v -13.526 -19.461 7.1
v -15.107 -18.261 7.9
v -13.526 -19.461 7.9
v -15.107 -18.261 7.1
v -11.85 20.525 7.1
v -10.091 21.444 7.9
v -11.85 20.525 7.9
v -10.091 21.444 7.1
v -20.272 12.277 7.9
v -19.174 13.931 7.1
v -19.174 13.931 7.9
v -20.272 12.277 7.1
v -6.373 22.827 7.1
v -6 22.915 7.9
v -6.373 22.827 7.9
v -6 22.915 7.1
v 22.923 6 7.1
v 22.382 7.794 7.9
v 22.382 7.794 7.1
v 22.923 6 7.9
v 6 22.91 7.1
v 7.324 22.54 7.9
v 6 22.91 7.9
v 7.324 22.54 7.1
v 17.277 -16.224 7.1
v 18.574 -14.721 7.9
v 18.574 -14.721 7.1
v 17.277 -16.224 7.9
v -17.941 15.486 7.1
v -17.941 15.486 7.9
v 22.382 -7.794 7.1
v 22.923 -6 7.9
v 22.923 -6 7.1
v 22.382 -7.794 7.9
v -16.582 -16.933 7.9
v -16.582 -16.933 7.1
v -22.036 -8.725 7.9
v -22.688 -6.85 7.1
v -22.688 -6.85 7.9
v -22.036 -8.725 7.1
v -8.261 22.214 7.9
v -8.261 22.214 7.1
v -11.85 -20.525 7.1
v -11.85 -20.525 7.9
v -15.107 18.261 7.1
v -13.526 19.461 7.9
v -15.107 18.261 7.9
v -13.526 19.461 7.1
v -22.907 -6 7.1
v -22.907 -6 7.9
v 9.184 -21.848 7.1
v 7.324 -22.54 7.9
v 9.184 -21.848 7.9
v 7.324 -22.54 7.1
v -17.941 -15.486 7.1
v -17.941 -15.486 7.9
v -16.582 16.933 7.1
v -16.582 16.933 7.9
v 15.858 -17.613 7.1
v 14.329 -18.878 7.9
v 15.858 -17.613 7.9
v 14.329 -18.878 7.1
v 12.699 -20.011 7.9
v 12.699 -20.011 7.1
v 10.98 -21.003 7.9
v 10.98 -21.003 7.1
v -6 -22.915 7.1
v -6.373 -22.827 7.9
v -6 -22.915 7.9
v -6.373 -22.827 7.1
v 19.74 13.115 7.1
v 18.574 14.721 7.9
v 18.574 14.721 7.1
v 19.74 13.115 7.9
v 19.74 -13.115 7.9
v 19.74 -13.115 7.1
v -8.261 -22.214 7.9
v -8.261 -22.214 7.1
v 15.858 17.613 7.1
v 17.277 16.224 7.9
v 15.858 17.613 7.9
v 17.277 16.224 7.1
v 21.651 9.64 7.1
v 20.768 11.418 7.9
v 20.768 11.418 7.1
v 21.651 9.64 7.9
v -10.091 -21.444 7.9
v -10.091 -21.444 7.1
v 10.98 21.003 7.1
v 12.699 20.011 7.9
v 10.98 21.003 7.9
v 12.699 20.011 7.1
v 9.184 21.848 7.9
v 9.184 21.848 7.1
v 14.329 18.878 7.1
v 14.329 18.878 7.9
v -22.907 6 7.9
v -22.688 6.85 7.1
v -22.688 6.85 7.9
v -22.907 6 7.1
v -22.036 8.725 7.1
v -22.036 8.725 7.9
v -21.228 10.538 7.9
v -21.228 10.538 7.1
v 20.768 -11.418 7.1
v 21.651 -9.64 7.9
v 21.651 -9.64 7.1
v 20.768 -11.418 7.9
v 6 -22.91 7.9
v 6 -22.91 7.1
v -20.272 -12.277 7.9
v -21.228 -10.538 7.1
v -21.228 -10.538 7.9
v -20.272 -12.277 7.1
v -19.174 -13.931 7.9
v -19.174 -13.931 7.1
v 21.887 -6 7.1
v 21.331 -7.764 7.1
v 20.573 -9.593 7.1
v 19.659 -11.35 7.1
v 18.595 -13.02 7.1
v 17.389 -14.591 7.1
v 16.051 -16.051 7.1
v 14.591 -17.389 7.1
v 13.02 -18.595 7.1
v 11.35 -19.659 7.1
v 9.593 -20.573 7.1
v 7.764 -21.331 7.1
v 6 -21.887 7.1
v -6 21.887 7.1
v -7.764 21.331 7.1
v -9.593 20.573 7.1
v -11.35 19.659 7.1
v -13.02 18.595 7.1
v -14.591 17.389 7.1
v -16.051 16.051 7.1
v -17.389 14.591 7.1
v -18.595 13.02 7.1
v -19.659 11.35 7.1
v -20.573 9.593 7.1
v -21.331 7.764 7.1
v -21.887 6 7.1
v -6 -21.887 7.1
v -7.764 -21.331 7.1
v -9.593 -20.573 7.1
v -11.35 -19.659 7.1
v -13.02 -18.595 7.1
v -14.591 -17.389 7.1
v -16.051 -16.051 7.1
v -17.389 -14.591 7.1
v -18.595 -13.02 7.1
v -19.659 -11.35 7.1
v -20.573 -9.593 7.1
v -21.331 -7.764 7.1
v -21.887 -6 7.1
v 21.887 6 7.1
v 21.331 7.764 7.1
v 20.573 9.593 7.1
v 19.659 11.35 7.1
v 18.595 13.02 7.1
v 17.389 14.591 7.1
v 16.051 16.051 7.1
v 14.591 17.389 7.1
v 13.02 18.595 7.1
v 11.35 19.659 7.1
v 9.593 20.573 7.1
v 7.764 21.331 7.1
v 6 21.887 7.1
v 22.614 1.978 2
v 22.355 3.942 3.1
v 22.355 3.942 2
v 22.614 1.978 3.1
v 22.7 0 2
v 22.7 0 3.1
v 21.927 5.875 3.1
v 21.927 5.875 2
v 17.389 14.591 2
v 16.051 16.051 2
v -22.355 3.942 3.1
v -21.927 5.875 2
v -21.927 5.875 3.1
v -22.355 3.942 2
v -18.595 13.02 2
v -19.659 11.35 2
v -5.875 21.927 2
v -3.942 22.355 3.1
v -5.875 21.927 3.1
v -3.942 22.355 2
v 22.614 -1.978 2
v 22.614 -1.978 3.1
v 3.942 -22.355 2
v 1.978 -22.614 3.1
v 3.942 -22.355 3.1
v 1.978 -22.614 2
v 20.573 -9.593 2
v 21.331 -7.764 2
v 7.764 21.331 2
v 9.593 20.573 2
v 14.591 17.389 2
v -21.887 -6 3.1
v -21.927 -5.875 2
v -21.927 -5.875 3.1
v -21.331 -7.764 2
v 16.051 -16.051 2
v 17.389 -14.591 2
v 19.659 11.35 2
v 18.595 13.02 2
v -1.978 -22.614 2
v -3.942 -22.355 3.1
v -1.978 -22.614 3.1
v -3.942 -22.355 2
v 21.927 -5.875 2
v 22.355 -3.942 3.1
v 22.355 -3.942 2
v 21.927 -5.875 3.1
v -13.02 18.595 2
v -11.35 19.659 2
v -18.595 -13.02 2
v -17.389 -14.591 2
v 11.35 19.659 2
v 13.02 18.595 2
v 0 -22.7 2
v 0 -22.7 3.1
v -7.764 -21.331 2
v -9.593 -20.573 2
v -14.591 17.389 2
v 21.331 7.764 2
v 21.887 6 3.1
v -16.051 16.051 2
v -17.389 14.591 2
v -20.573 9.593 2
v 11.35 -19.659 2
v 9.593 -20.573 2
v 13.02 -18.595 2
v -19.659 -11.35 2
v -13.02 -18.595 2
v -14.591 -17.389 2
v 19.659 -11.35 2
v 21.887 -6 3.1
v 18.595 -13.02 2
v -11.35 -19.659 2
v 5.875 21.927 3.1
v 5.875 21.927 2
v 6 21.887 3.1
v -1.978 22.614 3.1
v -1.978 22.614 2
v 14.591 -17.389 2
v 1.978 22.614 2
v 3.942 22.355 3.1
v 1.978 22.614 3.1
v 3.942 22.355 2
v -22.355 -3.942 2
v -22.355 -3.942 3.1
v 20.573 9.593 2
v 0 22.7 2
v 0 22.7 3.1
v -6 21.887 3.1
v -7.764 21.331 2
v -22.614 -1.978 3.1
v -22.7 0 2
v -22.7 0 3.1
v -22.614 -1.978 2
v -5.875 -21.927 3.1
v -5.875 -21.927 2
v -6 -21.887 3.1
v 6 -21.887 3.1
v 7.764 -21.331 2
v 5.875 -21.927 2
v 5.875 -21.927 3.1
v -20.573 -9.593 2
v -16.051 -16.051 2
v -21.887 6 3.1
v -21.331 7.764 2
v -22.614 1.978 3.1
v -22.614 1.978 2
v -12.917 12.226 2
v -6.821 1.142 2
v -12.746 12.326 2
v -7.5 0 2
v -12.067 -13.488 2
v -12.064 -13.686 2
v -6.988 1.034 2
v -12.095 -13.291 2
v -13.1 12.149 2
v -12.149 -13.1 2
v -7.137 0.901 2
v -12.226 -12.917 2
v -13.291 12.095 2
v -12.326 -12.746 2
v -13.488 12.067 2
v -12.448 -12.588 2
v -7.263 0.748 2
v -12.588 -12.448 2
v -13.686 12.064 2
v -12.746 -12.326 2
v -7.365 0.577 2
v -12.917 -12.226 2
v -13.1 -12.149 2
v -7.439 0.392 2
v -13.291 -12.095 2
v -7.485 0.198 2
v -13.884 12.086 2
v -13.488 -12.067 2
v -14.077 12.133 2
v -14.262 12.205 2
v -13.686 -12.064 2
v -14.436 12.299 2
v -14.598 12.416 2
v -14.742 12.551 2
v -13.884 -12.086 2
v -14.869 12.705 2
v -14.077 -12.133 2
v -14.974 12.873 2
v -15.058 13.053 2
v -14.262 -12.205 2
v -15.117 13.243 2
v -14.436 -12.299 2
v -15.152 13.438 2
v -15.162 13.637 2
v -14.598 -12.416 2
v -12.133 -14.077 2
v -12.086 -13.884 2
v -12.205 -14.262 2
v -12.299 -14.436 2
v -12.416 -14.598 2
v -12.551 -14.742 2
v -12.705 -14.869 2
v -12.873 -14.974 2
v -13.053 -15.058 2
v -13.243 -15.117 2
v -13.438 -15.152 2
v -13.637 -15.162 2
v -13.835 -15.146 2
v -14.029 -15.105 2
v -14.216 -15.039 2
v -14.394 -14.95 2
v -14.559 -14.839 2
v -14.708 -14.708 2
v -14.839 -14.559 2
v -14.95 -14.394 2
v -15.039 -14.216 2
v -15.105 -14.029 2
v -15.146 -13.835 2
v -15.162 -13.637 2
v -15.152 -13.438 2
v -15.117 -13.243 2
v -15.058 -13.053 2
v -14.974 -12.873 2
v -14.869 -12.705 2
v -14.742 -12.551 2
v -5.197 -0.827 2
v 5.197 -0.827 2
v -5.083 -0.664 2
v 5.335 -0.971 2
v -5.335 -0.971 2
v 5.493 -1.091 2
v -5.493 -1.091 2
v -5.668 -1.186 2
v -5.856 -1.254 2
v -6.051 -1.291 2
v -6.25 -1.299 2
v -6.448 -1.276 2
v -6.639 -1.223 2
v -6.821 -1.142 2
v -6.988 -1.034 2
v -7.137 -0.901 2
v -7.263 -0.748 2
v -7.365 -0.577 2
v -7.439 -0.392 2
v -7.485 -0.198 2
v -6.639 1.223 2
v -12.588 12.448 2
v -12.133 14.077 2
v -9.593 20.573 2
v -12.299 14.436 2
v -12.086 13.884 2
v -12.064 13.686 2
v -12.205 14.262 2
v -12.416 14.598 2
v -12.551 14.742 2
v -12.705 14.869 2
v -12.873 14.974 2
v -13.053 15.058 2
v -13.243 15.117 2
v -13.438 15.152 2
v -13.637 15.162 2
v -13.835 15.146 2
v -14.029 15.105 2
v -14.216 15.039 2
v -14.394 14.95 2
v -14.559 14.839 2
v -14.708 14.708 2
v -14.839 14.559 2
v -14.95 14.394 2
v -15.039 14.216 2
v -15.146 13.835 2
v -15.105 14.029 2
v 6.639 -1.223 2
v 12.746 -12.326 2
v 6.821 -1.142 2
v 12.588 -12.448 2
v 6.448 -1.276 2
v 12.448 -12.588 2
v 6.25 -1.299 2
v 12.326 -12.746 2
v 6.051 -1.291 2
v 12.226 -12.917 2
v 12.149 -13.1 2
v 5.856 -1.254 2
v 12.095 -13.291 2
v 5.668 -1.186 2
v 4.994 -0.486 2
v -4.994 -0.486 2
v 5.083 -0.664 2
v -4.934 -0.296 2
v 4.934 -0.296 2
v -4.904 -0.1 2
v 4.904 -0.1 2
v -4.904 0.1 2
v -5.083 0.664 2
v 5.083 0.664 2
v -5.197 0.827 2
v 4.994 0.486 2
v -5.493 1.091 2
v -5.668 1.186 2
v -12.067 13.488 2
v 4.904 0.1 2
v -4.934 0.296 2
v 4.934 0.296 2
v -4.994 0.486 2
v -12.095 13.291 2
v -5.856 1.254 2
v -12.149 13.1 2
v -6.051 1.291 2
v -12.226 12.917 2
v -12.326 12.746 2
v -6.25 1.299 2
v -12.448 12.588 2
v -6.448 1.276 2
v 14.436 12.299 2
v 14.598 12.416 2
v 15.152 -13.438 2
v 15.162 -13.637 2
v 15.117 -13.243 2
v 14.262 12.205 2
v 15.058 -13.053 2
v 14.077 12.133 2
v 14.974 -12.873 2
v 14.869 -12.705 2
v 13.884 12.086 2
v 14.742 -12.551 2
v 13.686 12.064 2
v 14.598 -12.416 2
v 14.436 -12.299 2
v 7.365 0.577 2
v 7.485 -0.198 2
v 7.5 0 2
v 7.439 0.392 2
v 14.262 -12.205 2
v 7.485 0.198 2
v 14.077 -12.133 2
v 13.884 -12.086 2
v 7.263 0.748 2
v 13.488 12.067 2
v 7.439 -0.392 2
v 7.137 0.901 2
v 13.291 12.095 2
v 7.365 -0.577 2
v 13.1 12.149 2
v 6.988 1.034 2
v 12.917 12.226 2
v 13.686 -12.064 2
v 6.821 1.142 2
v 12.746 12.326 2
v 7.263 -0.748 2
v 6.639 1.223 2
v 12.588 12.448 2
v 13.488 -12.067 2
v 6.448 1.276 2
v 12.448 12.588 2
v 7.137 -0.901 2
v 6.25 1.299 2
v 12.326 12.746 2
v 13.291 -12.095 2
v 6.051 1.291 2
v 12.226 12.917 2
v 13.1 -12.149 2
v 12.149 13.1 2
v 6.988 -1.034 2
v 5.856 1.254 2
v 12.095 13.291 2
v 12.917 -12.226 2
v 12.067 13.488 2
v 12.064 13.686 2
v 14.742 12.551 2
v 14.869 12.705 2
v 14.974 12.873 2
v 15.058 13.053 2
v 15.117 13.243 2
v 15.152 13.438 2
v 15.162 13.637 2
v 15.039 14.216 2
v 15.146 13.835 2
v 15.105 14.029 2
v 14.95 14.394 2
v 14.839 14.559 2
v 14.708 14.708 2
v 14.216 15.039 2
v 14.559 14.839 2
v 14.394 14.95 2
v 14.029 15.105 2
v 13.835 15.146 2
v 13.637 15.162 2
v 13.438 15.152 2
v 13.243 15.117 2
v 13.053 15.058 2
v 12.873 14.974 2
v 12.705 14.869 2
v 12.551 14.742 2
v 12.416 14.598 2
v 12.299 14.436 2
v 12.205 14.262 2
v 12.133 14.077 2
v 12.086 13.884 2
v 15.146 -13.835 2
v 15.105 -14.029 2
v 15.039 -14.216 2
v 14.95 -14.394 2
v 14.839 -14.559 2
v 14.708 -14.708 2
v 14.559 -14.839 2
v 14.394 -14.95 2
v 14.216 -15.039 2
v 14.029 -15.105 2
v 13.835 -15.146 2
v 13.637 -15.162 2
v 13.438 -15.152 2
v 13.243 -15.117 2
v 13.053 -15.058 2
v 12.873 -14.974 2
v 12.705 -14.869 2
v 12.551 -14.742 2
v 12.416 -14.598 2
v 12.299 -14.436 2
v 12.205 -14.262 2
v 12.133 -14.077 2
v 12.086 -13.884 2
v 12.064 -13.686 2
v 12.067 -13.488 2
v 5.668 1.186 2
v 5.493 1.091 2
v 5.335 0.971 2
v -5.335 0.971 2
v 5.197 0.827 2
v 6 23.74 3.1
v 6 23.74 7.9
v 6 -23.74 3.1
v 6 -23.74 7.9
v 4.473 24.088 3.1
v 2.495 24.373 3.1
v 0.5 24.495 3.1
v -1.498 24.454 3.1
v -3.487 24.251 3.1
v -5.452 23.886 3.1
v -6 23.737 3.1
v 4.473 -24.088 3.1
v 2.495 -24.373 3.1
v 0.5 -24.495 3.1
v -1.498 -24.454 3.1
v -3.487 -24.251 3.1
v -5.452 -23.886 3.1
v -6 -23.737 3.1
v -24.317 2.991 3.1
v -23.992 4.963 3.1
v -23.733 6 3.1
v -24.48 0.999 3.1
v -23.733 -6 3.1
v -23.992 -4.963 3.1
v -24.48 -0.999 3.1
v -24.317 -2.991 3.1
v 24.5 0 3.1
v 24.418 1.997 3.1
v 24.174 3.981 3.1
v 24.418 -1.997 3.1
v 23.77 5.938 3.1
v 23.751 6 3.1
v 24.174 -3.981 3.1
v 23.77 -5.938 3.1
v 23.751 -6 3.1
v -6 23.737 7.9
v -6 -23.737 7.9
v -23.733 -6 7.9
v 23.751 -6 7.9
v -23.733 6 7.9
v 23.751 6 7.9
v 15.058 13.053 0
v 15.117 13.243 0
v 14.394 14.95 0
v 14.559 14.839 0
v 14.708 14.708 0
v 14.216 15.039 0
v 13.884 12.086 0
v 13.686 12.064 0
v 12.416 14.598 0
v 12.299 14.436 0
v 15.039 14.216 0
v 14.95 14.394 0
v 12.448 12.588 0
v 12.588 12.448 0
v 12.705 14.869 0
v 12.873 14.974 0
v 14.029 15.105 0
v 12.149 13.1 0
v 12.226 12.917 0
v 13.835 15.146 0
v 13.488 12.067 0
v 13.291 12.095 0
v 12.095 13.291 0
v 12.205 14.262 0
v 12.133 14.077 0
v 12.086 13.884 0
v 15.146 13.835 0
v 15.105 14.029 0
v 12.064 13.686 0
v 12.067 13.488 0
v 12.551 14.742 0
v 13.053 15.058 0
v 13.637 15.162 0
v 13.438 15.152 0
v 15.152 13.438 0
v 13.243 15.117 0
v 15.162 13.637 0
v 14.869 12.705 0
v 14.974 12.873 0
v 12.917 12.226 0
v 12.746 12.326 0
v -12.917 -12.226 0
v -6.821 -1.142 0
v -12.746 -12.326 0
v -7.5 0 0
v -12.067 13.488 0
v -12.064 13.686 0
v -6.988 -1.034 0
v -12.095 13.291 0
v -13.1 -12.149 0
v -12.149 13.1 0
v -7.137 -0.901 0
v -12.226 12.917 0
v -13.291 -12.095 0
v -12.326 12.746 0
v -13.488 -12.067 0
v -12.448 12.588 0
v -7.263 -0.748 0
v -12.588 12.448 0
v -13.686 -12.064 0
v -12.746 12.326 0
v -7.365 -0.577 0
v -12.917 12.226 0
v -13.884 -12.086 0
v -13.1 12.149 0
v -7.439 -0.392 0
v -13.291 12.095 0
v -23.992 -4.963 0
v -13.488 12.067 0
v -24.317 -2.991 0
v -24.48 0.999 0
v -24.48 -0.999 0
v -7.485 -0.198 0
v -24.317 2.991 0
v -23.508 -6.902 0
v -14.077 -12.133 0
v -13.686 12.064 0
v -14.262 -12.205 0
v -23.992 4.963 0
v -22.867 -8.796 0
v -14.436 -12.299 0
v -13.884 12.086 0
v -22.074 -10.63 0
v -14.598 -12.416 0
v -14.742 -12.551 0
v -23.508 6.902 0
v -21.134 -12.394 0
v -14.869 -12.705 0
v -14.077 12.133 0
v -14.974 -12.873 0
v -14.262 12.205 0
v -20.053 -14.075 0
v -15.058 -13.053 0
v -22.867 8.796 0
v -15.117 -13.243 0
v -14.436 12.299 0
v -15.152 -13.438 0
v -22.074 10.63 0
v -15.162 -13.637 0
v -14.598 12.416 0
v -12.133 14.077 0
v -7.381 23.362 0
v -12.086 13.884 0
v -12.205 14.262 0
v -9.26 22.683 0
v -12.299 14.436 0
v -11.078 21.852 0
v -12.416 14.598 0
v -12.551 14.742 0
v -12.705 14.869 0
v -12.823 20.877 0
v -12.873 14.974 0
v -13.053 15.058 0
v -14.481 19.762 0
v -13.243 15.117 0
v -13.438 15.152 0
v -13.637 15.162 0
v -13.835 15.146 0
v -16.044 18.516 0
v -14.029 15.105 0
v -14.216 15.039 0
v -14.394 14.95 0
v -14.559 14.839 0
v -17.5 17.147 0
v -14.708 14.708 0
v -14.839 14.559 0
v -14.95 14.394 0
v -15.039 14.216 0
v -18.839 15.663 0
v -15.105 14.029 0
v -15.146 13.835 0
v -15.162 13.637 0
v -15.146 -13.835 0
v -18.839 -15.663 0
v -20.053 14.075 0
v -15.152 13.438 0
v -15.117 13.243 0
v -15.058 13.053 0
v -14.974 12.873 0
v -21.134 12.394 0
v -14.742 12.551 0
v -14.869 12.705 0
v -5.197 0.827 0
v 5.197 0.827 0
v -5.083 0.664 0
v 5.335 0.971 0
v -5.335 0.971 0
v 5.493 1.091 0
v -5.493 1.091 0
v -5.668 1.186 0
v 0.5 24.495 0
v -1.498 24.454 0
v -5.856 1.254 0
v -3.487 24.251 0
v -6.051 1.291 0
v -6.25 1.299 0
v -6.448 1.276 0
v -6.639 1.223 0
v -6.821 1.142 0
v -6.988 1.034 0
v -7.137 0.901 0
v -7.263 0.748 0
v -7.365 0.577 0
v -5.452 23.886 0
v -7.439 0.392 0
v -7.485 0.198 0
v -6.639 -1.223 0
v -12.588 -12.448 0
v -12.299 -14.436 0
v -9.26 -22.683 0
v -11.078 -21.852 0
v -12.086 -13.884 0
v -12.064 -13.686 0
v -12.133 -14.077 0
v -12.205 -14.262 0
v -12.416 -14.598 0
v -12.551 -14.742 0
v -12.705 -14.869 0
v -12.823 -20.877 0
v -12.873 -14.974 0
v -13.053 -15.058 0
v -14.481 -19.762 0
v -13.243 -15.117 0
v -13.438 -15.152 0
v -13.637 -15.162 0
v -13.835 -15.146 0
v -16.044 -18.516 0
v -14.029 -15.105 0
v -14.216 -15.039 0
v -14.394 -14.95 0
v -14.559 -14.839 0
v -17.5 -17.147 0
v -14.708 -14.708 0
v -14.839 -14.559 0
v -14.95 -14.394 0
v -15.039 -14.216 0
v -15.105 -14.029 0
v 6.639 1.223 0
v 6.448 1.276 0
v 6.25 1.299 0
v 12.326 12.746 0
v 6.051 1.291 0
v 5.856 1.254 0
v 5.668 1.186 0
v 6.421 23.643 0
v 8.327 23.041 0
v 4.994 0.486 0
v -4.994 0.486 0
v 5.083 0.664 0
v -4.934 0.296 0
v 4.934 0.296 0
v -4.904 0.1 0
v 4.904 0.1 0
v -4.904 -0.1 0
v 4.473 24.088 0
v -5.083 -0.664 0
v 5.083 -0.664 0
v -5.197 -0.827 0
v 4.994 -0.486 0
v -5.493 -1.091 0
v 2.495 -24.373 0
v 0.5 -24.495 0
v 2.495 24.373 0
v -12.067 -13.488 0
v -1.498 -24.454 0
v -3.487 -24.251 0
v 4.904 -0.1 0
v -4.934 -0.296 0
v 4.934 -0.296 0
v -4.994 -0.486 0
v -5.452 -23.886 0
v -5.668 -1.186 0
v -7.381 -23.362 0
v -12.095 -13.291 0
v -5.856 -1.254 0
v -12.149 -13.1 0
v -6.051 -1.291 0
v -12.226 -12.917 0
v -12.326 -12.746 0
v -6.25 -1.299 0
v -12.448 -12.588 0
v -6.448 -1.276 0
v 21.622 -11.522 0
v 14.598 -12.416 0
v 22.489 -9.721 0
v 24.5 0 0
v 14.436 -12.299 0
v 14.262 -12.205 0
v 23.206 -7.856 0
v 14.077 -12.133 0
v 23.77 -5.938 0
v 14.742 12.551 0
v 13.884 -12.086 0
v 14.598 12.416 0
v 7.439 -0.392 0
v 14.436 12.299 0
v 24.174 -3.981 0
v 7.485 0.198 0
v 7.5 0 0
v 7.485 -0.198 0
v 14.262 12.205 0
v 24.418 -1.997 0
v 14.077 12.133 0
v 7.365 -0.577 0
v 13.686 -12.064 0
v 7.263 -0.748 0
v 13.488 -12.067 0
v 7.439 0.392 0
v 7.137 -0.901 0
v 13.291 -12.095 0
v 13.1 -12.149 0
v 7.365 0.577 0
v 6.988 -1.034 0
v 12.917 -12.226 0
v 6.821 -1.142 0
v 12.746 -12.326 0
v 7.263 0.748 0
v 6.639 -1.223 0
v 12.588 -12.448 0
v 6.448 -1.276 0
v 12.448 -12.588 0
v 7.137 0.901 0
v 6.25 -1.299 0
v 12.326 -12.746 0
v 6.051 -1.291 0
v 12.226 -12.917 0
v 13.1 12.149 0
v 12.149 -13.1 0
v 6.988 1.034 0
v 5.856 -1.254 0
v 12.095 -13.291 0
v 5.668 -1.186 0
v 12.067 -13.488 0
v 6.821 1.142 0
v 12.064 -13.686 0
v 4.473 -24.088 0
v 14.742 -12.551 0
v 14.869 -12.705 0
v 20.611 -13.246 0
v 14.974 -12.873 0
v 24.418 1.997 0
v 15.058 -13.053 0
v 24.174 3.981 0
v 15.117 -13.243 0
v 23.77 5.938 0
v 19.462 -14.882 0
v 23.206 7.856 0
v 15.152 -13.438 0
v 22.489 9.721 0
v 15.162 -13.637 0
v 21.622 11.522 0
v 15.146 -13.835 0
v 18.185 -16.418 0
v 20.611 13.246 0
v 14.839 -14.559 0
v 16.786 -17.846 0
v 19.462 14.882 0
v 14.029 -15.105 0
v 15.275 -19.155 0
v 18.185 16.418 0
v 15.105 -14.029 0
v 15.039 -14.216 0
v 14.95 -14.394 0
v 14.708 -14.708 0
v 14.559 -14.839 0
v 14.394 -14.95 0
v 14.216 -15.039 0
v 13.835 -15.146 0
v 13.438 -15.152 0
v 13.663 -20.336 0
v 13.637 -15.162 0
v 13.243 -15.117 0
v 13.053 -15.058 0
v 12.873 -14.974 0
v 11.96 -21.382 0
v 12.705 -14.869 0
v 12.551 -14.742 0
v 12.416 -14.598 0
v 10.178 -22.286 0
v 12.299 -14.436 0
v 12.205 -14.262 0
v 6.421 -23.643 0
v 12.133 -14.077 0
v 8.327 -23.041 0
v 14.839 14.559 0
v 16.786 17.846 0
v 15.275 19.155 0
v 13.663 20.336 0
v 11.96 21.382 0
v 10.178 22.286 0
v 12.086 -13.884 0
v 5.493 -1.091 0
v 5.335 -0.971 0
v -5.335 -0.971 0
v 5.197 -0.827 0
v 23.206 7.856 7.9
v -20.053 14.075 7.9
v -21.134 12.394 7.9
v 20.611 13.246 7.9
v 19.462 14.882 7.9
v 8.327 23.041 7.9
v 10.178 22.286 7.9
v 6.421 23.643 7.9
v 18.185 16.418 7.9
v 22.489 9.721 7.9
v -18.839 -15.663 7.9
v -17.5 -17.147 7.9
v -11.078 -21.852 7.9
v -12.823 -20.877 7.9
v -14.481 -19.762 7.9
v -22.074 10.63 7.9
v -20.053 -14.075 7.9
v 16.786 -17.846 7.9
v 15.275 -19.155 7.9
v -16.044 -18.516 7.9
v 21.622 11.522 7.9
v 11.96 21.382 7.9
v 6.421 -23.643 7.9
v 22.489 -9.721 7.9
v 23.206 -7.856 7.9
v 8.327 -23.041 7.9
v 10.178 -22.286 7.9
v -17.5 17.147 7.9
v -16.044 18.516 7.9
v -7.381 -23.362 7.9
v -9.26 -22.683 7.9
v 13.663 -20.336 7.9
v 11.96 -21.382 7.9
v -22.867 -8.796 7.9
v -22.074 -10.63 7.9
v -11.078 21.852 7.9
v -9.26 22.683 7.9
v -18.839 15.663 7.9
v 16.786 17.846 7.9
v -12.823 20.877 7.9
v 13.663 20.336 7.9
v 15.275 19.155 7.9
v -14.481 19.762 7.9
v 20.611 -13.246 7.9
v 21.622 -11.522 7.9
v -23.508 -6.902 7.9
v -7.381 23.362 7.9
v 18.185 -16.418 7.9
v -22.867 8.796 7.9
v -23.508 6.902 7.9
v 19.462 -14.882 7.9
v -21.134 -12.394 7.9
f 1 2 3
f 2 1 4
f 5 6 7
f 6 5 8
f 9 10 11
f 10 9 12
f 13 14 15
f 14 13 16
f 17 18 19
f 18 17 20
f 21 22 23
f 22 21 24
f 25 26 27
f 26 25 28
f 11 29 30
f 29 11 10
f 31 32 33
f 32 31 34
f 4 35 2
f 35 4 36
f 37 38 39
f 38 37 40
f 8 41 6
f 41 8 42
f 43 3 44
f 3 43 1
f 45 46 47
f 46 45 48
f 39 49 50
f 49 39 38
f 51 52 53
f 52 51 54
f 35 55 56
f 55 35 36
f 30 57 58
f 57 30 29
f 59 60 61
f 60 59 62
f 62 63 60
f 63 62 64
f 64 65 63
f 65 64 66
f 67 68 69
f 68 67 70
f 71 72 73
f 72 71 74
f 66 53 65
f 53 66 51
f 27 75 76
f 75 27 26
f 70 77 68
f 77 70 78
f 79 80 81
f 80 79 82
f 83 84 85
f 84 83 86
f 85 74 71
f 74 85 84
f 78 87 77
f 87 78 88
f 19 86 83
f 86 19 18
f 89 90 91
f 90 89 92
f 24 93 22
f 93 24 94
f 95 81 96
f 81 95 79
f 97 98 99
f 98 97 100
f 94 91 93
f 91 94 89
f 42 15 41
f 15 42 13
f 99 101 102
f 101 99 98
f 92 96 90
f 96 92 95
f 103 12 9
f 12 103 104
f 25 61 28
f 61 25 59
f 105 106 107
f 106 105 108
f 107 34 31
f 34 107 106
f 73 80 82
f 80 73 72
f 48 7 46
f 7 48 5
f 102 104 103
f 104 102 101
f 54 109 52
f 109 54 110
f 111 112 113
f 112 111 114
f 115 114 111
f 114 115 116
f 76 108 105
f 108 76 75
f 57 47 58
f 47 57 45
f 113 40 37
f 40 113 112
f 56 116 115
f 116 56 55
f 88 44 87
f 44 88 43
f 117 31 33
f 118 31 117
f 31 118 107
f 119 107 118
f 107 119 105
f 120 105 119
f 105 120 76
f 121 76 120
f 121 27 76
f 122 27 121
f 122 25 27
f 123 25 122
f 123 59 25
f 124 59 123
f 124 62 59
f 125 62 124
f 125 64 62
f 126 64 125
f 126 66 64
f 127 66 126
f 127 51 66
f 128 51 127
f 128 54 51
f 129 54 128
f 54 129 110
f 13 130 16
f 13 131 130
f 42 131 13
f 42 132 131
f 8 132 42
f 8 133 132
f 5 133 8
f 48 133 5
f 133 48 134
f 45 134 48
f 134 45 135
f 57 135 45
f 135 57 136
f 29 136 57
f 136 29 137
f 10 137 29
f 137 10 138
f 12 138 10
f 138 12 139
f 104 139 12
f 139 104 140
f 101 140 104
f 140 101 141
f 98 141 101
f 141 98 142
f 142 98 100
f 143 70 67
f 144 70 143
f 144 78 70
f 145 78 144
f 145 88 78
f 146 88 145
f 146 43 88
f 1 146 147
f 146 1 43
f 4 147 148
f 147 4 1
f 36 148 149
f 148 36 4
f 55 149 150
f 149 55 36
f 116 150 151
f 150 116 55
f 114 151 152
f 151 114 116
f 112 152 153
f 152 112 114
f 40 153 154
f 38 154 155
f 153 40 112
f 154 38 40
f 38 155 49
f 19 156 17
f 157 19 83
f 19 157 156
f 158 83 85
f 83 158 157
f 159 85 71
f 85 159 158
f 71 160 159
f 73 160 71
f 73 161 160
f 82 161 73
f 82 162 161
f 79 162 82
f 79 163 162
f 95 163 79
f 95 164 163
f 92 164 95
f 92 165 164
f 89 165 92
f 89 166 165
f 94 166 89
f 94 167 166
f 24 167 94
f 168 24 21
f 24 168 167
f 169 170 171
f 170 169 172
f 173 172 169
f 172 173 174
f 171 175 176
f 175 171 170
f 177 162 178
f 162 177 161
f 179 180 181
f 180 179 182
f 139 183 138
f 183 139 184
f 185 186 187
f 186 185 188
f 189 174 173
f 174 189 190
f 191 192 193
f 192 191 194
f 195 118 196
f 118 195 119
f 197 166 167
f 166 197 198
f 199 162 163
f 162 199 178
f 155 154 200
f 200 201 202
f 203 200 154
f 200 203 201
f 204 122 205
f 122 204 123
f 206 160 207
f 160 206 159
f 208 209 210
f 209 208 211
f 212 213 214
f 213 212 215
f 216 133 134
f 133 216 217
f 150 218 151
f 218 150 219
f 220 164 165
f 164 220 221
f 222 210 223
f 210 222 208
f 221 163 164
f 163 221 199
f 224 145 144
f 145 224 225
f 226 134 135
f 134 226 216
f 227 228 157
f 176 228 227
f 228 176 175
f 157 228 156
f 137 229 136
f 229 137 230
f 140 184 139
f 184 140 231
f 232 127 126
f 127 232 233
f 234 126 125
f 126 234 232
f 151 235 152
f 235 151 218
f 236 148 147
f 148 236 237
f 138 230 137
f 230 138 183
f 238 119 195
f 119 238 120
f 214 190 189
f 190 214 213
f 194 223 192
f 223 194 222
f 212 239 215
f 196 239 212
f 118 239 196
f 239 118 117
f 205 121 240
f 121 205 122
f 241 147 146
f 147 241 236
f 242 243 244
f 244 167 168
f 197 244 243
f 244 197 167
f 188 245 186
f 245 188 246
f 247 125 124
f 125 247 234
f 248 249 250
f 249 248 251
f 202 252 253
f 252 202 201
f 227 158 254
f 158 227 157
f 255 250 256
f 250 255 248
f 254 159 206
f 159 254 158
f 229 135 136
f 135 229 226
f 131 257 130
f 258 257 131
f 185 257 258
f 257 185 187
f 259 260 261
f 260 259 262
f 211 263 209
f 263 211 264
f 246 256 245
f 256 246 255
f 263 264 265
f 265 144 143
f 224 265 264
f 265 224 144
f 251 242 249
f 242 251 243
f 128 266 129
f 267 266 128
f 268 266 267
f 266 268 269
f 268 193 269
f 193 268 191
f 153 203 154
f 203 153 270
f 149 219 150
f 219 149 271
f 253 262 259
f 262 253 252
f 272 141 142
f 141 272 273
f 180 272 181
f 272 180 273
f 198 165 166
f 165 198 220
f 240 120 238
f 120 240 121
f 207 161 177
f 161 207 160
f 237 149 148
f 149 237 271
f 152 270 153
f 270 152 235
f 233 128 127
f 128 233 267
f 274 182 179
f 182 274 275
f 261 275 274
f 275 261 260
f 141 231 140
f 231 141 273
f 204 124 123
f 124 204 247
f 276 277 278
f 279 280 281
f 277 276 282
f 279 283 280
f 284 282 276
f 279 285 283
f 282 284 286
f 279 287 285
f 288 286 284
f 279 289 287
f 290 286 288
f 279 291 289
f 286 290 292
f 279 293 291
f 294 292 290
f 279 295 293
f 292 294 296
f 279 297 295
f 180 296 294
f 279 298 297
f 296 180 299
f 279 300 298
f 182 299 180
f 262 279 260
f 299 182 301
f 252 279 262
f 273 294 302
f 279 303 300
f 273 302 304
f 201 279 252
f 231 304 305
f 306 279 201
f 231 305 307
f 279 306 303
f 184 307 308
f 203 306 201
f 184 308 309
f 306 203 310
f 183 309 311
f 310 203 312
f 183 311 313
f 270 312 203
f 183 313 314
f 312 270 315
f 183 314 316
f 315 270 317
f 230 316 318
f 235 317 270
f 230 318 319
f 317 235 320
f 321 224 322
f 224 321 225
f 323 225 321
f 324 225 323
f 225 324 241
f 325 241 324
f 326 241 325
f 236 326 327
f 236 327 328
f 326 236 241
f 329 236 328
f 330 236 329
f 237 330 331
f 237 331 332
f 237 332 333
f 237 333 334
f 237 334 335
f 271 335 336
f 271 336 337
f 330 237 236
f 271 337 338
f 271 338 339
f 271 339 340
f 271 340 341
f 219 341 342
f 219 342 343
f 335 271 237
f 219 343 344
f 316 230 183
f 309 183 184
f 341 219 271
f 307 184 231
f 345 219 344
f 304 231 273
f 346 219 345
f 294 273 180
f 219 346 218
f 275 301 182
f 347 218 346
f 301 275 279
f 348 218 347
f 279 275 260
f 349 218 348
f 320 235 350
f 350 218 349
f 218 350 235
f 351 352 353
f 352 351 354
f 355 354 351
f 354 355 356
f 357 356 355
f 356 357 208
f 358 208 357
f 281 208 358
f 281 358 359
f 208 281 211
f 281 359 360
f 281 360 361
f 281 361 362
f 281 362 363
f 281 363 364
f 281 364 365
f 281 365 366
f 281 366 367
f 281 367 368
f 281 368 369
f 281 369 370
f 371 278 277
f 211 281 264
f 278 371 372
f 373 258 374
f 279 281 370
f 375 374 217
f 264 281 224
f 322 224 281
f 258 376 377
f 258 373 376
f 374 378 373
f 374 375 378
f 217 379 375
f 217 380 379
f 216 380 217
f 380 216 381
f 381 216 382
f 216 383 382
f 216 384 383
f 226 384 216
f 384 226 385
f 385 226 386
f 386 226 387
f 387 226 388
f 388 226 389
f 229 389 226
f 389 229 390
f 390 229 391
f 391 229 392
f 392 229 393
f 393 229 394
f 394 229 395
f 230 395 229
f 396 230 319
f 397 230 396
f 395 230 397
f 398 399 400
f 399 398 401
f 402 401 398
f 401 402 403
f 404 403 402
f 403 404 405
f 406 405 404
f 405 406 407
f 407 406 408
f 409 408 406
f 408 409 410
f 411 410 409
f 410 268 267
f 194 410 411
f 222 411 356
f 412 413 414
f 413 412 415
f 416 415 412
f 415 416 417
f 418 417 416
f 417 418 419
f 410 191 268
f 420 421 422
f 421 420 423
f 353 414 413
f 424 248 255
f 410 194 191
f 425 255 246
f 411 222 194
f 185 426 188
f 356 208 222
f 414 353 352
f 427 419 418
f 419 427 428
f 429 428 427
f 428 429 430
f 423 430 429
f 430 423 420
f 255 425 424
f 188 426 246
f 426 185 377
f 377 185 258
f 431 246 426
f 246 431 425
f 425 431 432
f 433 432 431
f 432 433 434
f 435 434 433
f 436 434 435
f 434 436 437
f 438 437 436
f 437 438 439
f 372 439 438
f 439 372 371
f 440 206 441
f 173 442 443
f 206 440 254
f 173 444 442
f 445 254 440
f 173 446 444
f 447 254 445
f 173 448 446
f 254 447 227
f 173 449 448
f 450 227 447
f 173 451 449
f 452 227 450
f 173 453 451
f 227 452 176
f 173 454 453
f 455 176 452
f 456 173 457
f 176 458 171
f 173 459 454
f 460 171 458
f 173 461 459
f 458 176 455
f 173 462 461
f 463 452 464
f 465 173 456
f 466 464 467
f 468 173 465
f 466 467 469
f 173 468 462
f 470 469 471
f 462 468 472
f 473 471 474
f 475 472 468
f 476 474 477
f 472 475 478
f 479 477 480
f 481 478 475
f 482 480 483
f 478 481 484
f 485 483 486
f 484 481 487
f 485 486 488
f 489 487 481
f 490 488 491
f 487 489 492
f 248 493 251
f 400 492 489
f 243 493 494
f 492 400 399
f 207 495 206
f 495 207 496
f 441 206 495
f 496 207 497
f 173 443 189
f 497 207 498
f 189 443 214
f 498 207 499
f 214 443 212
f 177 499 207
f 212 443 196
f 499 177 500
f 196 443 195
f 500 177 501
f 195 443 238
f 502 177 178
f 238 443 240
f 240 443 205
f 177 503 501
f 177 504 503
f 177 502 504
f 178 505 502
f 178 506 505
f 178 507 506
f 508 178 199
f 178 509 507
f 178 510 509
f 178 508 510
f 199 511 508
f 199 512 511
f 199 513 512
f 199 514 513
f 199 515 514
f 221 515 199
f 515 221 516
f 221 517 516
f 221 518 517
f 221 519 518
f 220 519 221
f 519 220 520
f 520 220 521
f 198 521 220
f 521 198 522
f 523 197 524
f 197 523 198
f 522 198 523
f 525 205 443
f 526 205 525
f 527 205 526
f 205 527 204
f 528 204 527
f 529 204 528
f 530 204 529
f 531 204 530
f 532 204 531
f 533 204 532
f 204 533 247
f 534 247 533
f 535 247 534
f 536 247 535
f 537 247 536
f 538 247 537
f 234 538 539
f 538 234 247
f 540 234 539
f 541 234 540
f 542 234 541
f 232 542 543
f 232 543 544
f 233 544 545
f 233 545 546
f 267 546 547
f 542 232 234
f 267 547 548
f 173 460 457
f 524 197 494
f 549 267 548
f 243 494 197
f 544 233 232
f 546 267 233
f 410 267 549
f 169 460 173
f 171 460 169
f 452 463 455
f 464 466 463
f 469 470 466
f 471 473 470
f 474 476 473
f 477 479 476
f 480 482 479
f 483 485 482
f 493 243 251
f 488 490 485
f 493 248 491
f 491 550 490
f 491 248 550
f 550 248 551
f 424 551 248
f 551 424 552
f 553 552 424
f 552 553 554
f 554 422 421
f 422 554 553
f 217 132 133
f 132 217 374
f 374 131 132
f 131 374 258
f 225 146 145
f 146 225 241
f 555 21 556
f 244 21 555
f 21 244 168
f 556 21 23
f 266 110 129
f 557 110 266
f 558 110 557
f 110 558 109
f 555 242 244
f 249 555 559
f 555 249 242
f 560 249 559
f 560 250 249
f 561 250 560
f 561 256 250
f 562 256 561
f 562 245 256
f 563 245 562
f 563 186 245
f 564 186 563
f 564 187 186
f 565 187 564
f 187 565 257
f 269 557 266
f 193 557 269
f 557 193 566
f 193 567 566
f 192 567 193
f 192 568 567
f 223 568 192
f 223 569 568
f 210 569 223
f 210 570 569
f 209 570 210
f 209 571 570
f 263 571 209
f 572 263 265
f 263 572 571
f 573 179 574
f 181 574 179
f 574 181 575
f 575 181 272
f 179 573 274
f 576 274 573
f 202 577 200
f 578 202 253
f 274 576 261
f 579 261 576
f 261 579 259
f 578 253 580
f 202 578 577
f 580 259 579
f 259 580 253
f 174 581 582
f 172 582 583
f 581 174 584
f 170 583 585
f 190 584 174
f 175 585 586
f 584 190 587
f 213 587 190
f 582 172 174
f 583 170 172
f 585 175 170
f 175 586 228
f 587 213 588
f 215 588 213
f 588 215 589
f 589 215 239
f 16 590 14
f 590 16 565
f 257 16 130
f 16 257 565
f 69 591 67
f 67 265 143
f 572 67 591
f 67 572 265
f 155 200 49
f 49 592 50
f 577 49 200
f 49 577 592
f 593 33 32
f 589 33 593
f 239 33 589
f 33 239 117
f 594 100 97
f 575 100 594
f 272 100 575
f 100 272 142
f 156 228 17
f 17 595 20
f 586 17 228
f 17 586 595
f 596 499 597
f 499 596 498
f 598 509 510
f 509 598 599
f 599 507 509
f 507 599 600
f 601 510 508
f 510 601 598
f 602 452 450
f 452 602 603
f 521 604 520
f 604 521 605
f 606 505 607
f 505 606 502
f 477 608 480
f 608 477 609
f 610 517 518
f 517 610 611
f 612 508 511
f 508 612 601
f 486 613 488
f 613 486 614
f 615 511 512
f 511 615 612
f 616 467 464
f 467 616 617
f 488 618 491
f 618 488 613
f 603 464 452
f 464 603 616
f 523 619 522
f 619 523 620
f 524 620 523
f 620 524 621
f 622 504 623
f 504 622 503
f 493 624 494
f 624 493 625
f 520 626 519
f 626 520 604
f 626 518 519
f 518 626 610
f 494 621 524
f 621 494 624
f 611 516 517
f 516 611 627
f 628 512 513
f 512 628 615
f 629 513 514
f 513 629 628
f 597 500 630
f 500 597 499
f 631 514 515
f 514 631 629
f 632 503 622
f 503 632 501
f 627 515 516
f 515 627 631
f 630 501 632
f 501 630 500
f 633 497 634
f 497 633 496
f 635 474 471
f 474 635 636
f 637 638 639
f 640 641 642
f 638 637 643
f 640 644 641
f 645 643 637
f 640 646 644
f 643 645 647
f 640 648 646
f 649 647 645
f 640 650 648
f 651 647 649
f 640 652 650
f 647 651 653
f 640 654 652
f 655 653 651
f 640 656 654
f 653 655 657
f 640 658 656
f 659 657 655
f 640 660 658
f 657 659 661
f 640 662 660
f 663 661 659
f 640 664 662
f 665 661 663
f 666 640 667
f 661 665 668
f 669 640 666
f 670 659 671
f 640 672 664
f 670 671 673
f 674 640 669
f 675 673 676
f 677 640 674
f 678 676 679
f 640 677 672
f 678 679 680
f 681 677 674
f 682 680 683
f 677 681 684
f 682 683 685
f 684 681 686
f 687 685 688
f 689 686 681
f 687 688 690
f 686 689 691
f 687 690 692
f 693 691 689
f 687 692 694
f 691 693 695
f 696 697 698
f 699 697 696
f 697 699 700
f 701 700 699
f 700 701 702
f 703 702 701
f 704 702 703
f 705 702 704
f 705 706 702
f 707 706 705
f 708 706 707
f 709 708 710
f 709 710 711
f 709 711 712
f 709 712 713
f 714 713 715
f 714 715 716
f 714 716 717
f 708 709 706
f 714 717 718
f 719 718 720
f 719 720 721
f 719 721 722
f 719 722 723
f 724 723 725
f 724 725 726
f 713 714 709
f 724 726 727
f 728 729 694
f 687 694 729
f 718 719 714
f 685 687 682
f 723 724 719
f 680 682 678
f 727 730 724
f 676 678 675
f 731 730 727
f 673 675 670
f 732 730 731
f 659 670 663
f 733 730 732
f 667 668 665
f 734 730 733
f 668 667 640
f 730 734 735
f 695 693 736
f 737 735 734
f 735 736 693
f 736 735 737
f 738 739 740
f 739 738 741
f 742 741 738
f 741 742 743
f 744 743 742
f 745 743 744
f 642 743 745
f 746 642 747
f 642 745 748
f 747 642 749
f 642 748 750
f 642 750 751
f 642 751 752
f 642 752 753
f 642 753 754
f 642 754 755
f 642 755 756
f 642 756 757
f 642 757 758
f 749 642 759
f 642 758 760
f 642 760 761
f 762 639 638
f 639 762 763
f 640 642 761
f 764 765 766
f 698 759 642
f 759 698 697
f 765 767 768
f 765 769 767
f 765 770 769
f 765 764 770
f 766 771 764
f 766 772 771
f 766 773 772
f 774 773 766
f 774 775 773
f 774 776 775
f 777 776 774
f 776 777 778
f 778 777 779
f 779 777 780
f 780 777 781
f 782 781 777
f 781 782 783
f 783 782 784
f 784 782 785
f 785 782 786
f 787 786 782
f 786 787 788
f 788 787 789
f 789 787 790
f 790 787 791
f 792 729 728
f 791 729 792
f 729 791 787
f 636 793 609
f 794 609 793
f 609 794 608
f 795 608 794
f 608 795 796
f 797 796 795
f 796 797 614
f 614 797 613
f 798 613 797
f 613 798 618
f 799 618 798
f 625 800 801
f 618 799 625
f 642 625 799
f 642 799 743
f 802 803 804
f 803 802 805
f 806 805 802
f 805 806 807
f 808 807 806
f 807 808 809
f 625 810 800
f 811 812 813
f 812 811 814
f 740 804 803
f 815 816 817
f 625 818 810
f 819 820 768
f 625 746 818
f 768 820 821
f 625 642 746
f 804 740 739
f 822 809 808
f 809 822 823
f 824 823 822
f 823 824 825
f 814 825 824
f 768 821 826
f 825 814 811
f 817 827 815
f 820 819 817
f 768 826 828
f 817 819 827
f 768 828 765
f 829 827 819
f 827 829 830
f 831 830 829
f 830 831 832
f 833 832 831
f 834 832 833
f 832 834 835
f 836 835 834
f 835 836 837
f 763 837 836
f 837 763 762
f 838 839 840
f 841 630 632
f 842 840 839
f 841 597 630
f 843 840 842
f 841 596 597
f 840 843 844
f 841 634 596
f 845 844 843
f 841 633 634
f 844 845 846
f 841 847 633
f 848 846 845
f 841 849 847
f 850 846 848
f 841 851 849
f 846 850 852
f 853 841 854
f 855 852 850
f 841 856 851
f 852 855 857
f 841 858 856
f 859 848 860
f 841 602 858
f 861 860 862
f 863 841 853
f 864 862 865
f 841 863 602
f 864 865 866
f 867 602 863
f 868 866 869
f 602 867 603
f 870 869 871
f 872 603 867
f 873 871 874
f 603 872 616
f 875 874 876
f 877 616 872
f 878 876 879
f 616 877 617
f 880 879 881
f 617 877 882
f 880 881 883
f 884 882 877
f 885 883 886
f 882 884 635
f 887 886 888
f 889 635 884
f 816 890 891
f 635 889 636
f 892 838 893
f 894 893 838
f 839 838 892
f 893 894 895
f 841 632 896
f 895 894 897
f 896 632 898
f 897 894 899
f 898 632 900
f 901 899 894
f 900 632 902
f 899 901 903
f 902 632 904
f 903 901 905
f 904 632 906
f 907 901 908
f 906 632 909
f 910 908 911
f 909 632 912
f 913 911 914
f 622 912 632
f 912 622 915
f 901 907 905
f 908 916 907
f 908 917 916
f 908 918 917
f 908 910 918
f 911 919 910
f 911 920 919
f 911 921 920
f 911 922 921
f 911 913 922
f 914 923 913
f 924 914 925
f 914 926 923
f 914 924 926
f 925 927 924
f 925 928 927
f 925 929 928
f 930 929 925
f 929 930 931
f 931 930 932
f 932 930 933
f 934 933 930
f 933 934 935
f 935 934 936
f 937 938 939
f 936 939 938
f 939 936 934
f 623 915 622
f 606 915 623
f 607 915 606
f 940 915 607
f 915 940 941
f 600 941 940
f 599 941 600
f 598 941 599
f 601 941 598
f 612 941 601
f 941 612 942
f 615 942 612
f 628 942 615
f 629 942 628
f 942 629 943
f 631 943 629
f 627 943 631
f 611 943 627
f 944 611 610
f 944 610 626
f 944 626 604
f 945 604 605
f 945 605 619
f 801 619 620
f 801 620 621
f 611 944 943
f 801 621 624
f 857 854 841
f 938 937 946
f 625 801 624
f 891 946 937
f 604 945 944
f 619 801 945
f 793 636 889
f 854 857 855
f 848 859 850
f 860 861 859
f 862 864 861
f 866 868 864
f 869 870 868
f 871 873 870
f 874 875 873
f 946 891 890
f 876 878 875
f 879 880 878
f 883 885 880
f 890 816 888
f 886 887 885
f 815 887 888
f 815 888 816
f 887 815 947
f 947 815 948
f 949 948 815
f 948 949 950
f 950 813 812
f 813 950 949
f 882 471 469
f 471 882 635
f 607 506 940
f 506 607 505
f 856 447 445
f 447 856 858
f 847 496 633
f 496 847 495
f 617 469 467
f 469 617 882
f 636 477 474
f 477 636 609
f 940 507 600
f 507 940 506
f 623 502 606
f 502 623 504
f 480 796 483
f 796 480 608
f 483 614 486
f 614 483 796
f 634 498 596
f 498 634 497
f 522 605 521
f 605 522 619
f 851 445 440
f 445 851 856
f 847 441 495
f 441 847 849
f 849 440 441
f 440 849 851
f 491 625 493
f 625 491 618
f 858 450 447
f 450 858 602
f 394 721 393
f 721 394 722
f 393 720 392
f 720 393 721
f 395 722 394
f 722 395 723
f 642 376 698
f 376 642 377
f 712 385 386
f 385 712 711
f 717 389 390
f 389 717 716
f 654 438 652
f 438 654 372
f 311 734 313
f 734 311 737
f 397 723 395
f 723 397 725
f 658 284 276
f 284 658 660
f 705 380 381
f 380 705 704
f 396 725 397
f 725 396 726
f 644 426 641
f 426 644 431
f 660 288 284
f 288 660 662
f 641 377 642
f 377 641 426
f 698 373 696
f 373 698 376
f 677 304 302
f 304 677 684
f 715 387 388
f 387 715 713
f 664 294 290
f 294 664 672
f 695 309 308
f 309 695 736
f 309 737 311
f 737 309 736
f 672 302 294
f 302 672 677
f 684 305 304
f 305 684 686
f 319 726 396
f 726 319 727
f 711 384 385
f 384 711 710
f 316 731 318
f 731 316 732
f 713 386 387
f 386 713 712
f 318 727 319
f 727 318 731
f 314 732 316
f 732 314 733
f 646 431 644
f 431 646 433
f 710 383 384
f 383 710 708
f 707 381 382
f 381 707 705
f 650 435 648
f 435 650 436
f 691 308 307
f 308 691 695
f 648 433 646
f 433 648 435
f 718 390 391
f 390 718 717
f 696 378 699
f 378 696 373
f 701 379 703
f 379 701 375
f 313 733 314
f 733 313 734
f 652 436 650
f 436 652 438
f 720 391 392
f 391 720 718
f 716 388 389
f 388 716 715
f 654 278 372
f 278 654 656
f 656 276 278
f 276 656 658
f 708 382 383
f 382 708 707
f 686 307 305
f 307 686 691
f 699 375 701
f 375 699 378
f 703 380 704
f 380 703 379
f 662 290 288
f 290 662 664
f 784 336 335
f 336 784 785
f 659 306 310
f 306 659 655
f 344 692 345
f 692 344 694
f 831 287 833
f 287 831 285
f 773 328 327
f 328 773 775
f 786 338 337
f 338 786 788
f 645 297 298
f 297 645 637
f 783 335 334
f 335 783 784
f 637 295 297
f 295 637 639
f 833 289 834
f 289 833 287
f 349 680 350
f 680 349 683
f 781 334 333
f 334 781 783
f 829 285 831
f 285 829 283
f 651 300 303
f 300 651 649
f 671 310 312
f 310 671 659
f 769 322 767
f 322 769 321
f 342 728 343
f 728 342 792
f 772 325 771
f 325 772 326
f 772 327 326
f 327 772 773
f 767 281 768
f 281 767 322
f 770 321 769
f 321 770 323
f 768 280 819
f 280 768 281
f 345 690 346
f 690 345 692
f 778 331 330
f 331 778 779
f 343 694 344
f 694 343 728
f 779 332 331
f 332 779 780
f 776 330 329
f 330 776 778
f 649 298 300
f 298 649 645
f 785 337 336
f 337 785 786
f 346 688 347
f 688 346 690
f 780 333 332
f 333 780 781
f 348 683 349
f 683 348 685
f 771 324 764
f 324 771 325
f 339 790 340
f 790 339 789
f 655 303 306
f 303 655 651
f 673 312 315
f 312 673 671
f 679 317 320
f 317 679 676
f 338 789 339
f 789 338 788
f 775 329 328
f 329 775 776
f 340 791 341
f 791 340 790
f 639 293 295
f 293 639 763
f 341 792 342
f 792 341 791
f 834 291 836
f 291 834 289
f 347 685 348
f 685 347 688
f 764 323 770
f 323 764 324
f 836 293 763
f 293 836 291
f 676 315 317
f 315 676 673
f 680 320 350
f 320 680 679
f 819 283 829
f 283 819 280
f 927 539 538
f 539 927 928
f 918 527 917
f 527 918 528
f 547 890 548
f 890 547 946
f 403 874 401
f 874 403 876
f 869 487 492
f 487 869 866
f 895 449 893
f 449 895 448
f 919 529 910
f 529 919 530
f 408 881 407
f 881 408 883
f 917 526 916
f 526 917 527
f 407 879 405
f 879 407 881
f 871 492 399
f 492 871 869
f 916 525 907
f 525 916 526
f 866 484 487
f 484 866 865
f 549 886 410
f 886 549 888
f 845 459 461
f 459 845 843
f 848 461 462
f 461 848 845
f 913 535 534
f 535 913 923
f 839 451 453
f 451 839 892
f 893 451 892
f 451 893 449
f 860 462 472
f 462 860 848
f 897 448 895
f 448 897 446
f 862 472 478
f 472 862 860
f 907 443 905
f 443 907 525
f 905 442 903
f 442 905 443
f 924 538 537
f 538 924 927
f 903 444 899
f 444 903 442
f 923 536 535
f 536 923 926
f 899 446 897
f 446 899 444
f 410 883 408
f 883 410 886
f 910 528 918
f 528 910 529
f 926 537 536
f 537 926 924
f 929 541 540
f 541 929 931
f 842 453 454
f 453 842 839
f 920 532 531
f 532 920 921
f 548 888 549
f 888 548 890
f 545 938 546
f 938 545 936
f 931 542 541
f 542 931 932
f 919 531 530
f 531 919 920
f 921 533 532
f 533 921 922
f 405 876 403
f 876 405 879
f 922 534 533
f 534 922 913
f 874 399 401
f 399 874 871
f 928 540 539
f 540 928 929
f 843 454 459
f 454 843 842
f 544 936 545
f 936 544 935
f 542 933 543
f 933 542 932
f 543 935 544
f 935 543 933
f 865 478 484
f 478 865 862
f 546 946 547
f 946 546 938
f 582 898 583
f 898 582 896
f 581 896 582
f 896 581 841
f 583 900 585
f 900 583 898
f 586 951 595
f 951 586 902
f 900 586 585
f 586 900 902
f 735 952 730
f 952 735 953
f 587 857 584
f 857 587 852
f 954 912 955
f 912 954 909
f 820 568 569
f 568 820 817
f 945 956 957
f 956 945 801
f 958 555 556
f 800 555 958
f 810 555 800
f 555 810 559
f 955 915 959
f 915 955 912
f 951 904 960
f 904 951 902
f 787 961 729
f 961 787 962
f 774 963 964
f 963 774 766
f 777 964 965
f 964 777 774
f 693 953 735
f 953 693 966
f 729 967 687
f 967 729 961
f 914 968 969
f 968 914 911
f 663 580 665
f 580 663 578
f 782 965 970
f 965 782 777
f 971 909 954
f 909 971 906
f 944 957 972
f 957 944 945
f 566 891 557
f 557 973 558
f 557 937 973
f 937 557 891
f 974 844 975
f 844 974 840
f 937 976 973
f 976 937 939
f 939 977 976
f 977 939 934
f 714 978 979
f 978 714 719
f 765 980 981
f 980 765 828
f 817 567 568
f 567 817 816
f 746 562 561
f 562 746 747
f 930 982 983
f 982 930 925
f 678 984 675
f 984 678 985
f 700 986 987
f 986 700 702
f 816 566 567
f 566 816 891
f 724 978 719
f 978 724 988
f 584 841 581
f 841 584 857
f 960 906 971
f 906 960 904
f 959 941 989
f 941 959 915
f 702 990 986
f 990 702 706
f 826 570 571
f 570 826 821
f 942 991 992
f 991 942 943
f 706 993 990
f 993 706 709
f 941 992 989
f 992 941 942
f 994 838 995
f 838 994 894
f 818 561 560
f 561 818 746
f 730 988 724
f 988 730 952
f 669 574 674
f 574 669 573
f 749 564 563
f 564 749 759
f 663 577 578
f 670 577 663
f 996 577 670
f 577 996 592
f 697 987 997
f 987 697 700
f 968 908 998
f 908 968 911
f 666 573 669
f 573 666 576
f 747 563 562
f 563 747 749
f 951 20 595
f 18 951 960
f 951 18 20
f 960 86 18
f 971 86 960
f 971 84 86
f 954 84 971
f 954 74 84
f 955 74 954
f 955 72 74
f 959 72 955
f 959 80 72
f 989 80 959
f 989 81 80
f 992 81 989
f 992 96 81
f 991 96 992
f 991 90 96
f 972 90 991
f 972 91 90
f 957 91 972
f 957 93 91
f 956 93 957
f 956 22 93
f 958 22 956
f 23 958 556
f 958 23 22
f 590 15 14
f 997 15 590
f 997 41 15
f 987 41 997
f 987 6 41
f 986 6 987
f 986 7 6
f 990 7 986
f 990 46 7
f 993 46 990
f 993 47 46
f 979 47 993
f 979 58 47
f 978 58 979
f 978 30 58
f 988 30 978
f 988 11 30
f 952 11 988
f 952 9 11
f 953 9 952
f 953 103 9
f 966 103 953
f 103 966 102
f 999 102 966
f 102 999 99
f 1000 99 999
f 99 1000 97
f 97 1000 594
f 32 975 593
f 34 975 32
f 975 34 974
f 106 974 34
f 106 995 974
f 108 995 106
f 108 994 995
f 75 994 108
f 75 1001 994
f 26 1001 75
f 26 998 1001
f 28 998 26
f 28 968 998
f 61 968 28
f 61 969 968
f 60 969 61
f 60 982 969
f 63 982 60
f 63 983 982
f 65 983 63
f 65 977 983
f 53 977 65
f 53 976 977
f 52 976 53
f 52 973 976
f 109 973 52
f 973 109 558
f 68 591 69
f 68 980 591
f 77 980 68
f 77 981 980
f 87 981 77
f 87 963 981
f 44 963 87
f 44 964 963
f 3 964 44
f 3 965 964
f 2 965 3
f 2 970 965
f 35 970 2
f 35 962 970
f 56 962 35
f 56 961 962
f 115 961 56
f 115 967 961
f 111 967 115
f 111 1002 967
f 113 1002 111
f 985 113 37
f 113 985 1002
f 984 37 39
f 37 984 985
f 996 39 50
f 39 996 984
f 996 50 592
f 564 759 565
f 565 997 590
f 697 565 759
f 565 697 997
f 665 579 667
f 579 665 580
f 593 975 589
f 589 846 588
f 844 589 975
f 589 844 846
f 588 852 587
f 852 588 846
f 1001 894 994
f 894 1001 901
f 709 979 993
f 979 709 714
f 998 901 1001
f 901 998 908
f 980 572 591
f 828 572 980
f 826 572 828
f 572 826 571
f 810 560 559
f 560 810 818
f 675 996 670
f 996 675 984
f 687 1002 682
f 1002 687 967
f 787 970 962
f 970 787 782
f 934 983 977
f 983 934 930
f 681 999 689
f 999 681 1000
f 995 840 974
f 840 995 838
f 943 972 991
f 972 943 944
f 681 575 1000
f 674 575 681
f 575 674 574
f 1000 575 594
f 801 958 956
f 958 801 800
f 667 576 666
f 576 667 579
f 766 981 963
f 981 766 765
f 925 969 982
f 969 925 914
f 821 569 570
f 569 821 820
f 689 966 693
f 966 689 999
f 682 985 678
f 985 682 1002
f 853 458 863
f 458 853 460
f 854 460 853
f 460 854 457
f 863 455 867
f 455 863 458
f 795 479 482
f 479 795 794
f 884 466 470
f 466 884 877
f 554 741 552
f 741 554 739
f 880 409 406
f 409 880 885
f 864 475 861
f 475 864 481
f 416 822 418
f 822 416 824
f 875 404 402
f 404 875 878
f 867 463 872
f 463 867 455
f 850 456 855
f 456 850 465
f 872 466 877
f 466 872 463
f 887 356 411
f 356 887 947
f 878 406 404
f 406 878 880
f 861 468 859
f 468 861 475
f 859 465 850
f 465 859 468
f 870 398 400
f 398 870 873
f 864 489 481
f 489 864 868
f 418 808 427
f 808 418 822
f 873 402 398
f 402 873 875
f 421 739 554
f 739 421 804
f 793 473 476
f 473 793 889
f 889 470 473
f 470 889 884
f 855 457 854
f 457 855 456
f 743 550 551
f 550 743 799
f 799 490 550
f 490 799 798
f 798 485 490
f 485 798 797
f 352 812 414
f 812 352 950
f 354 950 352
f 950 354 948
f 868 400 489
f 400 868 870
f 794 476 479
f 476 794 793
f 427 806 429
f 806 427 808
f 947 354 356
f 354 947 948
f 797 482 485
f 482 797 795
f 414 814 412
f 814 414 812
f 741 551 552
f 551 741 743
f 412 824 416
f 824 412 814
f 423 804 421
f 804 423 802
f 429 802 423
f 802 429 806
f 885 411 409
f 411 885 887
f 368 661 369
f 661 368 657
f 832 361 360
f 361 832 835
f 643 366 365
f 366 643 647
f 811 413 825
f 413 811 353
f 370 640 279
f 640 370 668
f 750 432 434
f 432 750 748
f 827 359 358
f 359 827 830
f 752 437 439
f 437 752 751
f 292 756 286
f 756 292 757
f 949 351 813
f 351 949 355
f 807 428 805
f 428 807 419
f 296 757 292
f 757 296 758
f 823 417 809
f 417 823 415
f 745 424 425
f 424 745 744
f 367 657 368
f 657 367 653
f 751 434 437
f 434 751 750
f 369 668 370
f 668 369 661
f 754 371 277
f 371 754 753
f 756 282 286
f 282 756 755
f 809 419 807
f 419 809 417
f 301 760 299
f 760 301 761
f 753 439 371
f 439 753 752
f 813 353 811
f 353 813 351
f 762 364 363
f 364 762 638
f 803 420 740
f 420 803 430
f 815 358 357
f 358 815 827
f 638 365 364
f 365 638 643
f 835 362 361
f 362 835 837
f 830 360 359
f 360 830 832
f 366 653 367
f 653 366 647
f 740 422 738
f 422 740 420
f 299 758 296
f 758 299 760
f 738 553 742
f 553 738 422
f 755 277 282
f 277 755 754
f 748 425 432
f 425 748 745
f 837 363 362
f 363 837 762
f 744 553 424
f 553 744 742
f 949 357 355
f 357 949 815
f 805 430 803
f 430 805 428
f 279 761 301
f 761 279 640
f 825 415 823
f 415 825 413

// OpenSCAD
$fa = 1;

margin = 0.2;

board_height = 2.6;
magnet_height = 1;
gap = 1.5;
bottom_thickness = 2;
edge_height = 1 - margin;

total_height = board_height + magnet_height + gap + bottom_thickness + edge_height;

motor_radius = 49 / 2;
edge_width = 1 - margin;
support_width = 1;

board_hole_radius = 2.2 / 2 + margin;
board_hole_distance = 9.8 / 2 + board_hole_radius;

echo(board_hole_distance);

mount_hole_radius = 2.7 / 2 + margin;
mount_hole_distance = 38.5 / 2;

wire_hole_width = 12;
wire_hole_depth = motor_radius * 2 + 0.1;
wire_hole_height = edge_height + 4;

module board_hole(deg) {
    $fs = 0.2;
    rotate([0, 0, deg])
    translate([board_hole_distance, 0, 0])
    cylinder(h = bottom_thickness + 0.1, r = board_hole_radius);
}

module mount_hole(deg) {
    $fs = 0.2;
    rotate([0, 0, deg])
    translate([mount_hole_distance, 0, 0])
    cylinder(h = bottom_thickness + 0.1, r = mount_hole_radius);
}

module wire_hole(deg) {
    rotate([0, 0, deg])
    translate([-wire_hole_width/2, -wire_hole_depth/2, 0])
    cube([wire_hole_width, wire_hole_depth, wire_hole_height]);
}

difference() {
    cylinder(h = total_height, r = motor_radius);

    translate([0, 0, total_height])
    mirror([0, 0, 1]) {
        cylinder(h = edge_height, r = motor_radius - edge_width);
        cylinder(h = total_height - bottom_thickness
            , r = motor_radius - edge_width - support_width);
        wire_hole(0);
        wire_hole(90);
    }
    
    board_hole(0);
    board_hole(180);
    
    for(deg = [45 : 90 : 360 - 45]) mount_hole(deg);
}
